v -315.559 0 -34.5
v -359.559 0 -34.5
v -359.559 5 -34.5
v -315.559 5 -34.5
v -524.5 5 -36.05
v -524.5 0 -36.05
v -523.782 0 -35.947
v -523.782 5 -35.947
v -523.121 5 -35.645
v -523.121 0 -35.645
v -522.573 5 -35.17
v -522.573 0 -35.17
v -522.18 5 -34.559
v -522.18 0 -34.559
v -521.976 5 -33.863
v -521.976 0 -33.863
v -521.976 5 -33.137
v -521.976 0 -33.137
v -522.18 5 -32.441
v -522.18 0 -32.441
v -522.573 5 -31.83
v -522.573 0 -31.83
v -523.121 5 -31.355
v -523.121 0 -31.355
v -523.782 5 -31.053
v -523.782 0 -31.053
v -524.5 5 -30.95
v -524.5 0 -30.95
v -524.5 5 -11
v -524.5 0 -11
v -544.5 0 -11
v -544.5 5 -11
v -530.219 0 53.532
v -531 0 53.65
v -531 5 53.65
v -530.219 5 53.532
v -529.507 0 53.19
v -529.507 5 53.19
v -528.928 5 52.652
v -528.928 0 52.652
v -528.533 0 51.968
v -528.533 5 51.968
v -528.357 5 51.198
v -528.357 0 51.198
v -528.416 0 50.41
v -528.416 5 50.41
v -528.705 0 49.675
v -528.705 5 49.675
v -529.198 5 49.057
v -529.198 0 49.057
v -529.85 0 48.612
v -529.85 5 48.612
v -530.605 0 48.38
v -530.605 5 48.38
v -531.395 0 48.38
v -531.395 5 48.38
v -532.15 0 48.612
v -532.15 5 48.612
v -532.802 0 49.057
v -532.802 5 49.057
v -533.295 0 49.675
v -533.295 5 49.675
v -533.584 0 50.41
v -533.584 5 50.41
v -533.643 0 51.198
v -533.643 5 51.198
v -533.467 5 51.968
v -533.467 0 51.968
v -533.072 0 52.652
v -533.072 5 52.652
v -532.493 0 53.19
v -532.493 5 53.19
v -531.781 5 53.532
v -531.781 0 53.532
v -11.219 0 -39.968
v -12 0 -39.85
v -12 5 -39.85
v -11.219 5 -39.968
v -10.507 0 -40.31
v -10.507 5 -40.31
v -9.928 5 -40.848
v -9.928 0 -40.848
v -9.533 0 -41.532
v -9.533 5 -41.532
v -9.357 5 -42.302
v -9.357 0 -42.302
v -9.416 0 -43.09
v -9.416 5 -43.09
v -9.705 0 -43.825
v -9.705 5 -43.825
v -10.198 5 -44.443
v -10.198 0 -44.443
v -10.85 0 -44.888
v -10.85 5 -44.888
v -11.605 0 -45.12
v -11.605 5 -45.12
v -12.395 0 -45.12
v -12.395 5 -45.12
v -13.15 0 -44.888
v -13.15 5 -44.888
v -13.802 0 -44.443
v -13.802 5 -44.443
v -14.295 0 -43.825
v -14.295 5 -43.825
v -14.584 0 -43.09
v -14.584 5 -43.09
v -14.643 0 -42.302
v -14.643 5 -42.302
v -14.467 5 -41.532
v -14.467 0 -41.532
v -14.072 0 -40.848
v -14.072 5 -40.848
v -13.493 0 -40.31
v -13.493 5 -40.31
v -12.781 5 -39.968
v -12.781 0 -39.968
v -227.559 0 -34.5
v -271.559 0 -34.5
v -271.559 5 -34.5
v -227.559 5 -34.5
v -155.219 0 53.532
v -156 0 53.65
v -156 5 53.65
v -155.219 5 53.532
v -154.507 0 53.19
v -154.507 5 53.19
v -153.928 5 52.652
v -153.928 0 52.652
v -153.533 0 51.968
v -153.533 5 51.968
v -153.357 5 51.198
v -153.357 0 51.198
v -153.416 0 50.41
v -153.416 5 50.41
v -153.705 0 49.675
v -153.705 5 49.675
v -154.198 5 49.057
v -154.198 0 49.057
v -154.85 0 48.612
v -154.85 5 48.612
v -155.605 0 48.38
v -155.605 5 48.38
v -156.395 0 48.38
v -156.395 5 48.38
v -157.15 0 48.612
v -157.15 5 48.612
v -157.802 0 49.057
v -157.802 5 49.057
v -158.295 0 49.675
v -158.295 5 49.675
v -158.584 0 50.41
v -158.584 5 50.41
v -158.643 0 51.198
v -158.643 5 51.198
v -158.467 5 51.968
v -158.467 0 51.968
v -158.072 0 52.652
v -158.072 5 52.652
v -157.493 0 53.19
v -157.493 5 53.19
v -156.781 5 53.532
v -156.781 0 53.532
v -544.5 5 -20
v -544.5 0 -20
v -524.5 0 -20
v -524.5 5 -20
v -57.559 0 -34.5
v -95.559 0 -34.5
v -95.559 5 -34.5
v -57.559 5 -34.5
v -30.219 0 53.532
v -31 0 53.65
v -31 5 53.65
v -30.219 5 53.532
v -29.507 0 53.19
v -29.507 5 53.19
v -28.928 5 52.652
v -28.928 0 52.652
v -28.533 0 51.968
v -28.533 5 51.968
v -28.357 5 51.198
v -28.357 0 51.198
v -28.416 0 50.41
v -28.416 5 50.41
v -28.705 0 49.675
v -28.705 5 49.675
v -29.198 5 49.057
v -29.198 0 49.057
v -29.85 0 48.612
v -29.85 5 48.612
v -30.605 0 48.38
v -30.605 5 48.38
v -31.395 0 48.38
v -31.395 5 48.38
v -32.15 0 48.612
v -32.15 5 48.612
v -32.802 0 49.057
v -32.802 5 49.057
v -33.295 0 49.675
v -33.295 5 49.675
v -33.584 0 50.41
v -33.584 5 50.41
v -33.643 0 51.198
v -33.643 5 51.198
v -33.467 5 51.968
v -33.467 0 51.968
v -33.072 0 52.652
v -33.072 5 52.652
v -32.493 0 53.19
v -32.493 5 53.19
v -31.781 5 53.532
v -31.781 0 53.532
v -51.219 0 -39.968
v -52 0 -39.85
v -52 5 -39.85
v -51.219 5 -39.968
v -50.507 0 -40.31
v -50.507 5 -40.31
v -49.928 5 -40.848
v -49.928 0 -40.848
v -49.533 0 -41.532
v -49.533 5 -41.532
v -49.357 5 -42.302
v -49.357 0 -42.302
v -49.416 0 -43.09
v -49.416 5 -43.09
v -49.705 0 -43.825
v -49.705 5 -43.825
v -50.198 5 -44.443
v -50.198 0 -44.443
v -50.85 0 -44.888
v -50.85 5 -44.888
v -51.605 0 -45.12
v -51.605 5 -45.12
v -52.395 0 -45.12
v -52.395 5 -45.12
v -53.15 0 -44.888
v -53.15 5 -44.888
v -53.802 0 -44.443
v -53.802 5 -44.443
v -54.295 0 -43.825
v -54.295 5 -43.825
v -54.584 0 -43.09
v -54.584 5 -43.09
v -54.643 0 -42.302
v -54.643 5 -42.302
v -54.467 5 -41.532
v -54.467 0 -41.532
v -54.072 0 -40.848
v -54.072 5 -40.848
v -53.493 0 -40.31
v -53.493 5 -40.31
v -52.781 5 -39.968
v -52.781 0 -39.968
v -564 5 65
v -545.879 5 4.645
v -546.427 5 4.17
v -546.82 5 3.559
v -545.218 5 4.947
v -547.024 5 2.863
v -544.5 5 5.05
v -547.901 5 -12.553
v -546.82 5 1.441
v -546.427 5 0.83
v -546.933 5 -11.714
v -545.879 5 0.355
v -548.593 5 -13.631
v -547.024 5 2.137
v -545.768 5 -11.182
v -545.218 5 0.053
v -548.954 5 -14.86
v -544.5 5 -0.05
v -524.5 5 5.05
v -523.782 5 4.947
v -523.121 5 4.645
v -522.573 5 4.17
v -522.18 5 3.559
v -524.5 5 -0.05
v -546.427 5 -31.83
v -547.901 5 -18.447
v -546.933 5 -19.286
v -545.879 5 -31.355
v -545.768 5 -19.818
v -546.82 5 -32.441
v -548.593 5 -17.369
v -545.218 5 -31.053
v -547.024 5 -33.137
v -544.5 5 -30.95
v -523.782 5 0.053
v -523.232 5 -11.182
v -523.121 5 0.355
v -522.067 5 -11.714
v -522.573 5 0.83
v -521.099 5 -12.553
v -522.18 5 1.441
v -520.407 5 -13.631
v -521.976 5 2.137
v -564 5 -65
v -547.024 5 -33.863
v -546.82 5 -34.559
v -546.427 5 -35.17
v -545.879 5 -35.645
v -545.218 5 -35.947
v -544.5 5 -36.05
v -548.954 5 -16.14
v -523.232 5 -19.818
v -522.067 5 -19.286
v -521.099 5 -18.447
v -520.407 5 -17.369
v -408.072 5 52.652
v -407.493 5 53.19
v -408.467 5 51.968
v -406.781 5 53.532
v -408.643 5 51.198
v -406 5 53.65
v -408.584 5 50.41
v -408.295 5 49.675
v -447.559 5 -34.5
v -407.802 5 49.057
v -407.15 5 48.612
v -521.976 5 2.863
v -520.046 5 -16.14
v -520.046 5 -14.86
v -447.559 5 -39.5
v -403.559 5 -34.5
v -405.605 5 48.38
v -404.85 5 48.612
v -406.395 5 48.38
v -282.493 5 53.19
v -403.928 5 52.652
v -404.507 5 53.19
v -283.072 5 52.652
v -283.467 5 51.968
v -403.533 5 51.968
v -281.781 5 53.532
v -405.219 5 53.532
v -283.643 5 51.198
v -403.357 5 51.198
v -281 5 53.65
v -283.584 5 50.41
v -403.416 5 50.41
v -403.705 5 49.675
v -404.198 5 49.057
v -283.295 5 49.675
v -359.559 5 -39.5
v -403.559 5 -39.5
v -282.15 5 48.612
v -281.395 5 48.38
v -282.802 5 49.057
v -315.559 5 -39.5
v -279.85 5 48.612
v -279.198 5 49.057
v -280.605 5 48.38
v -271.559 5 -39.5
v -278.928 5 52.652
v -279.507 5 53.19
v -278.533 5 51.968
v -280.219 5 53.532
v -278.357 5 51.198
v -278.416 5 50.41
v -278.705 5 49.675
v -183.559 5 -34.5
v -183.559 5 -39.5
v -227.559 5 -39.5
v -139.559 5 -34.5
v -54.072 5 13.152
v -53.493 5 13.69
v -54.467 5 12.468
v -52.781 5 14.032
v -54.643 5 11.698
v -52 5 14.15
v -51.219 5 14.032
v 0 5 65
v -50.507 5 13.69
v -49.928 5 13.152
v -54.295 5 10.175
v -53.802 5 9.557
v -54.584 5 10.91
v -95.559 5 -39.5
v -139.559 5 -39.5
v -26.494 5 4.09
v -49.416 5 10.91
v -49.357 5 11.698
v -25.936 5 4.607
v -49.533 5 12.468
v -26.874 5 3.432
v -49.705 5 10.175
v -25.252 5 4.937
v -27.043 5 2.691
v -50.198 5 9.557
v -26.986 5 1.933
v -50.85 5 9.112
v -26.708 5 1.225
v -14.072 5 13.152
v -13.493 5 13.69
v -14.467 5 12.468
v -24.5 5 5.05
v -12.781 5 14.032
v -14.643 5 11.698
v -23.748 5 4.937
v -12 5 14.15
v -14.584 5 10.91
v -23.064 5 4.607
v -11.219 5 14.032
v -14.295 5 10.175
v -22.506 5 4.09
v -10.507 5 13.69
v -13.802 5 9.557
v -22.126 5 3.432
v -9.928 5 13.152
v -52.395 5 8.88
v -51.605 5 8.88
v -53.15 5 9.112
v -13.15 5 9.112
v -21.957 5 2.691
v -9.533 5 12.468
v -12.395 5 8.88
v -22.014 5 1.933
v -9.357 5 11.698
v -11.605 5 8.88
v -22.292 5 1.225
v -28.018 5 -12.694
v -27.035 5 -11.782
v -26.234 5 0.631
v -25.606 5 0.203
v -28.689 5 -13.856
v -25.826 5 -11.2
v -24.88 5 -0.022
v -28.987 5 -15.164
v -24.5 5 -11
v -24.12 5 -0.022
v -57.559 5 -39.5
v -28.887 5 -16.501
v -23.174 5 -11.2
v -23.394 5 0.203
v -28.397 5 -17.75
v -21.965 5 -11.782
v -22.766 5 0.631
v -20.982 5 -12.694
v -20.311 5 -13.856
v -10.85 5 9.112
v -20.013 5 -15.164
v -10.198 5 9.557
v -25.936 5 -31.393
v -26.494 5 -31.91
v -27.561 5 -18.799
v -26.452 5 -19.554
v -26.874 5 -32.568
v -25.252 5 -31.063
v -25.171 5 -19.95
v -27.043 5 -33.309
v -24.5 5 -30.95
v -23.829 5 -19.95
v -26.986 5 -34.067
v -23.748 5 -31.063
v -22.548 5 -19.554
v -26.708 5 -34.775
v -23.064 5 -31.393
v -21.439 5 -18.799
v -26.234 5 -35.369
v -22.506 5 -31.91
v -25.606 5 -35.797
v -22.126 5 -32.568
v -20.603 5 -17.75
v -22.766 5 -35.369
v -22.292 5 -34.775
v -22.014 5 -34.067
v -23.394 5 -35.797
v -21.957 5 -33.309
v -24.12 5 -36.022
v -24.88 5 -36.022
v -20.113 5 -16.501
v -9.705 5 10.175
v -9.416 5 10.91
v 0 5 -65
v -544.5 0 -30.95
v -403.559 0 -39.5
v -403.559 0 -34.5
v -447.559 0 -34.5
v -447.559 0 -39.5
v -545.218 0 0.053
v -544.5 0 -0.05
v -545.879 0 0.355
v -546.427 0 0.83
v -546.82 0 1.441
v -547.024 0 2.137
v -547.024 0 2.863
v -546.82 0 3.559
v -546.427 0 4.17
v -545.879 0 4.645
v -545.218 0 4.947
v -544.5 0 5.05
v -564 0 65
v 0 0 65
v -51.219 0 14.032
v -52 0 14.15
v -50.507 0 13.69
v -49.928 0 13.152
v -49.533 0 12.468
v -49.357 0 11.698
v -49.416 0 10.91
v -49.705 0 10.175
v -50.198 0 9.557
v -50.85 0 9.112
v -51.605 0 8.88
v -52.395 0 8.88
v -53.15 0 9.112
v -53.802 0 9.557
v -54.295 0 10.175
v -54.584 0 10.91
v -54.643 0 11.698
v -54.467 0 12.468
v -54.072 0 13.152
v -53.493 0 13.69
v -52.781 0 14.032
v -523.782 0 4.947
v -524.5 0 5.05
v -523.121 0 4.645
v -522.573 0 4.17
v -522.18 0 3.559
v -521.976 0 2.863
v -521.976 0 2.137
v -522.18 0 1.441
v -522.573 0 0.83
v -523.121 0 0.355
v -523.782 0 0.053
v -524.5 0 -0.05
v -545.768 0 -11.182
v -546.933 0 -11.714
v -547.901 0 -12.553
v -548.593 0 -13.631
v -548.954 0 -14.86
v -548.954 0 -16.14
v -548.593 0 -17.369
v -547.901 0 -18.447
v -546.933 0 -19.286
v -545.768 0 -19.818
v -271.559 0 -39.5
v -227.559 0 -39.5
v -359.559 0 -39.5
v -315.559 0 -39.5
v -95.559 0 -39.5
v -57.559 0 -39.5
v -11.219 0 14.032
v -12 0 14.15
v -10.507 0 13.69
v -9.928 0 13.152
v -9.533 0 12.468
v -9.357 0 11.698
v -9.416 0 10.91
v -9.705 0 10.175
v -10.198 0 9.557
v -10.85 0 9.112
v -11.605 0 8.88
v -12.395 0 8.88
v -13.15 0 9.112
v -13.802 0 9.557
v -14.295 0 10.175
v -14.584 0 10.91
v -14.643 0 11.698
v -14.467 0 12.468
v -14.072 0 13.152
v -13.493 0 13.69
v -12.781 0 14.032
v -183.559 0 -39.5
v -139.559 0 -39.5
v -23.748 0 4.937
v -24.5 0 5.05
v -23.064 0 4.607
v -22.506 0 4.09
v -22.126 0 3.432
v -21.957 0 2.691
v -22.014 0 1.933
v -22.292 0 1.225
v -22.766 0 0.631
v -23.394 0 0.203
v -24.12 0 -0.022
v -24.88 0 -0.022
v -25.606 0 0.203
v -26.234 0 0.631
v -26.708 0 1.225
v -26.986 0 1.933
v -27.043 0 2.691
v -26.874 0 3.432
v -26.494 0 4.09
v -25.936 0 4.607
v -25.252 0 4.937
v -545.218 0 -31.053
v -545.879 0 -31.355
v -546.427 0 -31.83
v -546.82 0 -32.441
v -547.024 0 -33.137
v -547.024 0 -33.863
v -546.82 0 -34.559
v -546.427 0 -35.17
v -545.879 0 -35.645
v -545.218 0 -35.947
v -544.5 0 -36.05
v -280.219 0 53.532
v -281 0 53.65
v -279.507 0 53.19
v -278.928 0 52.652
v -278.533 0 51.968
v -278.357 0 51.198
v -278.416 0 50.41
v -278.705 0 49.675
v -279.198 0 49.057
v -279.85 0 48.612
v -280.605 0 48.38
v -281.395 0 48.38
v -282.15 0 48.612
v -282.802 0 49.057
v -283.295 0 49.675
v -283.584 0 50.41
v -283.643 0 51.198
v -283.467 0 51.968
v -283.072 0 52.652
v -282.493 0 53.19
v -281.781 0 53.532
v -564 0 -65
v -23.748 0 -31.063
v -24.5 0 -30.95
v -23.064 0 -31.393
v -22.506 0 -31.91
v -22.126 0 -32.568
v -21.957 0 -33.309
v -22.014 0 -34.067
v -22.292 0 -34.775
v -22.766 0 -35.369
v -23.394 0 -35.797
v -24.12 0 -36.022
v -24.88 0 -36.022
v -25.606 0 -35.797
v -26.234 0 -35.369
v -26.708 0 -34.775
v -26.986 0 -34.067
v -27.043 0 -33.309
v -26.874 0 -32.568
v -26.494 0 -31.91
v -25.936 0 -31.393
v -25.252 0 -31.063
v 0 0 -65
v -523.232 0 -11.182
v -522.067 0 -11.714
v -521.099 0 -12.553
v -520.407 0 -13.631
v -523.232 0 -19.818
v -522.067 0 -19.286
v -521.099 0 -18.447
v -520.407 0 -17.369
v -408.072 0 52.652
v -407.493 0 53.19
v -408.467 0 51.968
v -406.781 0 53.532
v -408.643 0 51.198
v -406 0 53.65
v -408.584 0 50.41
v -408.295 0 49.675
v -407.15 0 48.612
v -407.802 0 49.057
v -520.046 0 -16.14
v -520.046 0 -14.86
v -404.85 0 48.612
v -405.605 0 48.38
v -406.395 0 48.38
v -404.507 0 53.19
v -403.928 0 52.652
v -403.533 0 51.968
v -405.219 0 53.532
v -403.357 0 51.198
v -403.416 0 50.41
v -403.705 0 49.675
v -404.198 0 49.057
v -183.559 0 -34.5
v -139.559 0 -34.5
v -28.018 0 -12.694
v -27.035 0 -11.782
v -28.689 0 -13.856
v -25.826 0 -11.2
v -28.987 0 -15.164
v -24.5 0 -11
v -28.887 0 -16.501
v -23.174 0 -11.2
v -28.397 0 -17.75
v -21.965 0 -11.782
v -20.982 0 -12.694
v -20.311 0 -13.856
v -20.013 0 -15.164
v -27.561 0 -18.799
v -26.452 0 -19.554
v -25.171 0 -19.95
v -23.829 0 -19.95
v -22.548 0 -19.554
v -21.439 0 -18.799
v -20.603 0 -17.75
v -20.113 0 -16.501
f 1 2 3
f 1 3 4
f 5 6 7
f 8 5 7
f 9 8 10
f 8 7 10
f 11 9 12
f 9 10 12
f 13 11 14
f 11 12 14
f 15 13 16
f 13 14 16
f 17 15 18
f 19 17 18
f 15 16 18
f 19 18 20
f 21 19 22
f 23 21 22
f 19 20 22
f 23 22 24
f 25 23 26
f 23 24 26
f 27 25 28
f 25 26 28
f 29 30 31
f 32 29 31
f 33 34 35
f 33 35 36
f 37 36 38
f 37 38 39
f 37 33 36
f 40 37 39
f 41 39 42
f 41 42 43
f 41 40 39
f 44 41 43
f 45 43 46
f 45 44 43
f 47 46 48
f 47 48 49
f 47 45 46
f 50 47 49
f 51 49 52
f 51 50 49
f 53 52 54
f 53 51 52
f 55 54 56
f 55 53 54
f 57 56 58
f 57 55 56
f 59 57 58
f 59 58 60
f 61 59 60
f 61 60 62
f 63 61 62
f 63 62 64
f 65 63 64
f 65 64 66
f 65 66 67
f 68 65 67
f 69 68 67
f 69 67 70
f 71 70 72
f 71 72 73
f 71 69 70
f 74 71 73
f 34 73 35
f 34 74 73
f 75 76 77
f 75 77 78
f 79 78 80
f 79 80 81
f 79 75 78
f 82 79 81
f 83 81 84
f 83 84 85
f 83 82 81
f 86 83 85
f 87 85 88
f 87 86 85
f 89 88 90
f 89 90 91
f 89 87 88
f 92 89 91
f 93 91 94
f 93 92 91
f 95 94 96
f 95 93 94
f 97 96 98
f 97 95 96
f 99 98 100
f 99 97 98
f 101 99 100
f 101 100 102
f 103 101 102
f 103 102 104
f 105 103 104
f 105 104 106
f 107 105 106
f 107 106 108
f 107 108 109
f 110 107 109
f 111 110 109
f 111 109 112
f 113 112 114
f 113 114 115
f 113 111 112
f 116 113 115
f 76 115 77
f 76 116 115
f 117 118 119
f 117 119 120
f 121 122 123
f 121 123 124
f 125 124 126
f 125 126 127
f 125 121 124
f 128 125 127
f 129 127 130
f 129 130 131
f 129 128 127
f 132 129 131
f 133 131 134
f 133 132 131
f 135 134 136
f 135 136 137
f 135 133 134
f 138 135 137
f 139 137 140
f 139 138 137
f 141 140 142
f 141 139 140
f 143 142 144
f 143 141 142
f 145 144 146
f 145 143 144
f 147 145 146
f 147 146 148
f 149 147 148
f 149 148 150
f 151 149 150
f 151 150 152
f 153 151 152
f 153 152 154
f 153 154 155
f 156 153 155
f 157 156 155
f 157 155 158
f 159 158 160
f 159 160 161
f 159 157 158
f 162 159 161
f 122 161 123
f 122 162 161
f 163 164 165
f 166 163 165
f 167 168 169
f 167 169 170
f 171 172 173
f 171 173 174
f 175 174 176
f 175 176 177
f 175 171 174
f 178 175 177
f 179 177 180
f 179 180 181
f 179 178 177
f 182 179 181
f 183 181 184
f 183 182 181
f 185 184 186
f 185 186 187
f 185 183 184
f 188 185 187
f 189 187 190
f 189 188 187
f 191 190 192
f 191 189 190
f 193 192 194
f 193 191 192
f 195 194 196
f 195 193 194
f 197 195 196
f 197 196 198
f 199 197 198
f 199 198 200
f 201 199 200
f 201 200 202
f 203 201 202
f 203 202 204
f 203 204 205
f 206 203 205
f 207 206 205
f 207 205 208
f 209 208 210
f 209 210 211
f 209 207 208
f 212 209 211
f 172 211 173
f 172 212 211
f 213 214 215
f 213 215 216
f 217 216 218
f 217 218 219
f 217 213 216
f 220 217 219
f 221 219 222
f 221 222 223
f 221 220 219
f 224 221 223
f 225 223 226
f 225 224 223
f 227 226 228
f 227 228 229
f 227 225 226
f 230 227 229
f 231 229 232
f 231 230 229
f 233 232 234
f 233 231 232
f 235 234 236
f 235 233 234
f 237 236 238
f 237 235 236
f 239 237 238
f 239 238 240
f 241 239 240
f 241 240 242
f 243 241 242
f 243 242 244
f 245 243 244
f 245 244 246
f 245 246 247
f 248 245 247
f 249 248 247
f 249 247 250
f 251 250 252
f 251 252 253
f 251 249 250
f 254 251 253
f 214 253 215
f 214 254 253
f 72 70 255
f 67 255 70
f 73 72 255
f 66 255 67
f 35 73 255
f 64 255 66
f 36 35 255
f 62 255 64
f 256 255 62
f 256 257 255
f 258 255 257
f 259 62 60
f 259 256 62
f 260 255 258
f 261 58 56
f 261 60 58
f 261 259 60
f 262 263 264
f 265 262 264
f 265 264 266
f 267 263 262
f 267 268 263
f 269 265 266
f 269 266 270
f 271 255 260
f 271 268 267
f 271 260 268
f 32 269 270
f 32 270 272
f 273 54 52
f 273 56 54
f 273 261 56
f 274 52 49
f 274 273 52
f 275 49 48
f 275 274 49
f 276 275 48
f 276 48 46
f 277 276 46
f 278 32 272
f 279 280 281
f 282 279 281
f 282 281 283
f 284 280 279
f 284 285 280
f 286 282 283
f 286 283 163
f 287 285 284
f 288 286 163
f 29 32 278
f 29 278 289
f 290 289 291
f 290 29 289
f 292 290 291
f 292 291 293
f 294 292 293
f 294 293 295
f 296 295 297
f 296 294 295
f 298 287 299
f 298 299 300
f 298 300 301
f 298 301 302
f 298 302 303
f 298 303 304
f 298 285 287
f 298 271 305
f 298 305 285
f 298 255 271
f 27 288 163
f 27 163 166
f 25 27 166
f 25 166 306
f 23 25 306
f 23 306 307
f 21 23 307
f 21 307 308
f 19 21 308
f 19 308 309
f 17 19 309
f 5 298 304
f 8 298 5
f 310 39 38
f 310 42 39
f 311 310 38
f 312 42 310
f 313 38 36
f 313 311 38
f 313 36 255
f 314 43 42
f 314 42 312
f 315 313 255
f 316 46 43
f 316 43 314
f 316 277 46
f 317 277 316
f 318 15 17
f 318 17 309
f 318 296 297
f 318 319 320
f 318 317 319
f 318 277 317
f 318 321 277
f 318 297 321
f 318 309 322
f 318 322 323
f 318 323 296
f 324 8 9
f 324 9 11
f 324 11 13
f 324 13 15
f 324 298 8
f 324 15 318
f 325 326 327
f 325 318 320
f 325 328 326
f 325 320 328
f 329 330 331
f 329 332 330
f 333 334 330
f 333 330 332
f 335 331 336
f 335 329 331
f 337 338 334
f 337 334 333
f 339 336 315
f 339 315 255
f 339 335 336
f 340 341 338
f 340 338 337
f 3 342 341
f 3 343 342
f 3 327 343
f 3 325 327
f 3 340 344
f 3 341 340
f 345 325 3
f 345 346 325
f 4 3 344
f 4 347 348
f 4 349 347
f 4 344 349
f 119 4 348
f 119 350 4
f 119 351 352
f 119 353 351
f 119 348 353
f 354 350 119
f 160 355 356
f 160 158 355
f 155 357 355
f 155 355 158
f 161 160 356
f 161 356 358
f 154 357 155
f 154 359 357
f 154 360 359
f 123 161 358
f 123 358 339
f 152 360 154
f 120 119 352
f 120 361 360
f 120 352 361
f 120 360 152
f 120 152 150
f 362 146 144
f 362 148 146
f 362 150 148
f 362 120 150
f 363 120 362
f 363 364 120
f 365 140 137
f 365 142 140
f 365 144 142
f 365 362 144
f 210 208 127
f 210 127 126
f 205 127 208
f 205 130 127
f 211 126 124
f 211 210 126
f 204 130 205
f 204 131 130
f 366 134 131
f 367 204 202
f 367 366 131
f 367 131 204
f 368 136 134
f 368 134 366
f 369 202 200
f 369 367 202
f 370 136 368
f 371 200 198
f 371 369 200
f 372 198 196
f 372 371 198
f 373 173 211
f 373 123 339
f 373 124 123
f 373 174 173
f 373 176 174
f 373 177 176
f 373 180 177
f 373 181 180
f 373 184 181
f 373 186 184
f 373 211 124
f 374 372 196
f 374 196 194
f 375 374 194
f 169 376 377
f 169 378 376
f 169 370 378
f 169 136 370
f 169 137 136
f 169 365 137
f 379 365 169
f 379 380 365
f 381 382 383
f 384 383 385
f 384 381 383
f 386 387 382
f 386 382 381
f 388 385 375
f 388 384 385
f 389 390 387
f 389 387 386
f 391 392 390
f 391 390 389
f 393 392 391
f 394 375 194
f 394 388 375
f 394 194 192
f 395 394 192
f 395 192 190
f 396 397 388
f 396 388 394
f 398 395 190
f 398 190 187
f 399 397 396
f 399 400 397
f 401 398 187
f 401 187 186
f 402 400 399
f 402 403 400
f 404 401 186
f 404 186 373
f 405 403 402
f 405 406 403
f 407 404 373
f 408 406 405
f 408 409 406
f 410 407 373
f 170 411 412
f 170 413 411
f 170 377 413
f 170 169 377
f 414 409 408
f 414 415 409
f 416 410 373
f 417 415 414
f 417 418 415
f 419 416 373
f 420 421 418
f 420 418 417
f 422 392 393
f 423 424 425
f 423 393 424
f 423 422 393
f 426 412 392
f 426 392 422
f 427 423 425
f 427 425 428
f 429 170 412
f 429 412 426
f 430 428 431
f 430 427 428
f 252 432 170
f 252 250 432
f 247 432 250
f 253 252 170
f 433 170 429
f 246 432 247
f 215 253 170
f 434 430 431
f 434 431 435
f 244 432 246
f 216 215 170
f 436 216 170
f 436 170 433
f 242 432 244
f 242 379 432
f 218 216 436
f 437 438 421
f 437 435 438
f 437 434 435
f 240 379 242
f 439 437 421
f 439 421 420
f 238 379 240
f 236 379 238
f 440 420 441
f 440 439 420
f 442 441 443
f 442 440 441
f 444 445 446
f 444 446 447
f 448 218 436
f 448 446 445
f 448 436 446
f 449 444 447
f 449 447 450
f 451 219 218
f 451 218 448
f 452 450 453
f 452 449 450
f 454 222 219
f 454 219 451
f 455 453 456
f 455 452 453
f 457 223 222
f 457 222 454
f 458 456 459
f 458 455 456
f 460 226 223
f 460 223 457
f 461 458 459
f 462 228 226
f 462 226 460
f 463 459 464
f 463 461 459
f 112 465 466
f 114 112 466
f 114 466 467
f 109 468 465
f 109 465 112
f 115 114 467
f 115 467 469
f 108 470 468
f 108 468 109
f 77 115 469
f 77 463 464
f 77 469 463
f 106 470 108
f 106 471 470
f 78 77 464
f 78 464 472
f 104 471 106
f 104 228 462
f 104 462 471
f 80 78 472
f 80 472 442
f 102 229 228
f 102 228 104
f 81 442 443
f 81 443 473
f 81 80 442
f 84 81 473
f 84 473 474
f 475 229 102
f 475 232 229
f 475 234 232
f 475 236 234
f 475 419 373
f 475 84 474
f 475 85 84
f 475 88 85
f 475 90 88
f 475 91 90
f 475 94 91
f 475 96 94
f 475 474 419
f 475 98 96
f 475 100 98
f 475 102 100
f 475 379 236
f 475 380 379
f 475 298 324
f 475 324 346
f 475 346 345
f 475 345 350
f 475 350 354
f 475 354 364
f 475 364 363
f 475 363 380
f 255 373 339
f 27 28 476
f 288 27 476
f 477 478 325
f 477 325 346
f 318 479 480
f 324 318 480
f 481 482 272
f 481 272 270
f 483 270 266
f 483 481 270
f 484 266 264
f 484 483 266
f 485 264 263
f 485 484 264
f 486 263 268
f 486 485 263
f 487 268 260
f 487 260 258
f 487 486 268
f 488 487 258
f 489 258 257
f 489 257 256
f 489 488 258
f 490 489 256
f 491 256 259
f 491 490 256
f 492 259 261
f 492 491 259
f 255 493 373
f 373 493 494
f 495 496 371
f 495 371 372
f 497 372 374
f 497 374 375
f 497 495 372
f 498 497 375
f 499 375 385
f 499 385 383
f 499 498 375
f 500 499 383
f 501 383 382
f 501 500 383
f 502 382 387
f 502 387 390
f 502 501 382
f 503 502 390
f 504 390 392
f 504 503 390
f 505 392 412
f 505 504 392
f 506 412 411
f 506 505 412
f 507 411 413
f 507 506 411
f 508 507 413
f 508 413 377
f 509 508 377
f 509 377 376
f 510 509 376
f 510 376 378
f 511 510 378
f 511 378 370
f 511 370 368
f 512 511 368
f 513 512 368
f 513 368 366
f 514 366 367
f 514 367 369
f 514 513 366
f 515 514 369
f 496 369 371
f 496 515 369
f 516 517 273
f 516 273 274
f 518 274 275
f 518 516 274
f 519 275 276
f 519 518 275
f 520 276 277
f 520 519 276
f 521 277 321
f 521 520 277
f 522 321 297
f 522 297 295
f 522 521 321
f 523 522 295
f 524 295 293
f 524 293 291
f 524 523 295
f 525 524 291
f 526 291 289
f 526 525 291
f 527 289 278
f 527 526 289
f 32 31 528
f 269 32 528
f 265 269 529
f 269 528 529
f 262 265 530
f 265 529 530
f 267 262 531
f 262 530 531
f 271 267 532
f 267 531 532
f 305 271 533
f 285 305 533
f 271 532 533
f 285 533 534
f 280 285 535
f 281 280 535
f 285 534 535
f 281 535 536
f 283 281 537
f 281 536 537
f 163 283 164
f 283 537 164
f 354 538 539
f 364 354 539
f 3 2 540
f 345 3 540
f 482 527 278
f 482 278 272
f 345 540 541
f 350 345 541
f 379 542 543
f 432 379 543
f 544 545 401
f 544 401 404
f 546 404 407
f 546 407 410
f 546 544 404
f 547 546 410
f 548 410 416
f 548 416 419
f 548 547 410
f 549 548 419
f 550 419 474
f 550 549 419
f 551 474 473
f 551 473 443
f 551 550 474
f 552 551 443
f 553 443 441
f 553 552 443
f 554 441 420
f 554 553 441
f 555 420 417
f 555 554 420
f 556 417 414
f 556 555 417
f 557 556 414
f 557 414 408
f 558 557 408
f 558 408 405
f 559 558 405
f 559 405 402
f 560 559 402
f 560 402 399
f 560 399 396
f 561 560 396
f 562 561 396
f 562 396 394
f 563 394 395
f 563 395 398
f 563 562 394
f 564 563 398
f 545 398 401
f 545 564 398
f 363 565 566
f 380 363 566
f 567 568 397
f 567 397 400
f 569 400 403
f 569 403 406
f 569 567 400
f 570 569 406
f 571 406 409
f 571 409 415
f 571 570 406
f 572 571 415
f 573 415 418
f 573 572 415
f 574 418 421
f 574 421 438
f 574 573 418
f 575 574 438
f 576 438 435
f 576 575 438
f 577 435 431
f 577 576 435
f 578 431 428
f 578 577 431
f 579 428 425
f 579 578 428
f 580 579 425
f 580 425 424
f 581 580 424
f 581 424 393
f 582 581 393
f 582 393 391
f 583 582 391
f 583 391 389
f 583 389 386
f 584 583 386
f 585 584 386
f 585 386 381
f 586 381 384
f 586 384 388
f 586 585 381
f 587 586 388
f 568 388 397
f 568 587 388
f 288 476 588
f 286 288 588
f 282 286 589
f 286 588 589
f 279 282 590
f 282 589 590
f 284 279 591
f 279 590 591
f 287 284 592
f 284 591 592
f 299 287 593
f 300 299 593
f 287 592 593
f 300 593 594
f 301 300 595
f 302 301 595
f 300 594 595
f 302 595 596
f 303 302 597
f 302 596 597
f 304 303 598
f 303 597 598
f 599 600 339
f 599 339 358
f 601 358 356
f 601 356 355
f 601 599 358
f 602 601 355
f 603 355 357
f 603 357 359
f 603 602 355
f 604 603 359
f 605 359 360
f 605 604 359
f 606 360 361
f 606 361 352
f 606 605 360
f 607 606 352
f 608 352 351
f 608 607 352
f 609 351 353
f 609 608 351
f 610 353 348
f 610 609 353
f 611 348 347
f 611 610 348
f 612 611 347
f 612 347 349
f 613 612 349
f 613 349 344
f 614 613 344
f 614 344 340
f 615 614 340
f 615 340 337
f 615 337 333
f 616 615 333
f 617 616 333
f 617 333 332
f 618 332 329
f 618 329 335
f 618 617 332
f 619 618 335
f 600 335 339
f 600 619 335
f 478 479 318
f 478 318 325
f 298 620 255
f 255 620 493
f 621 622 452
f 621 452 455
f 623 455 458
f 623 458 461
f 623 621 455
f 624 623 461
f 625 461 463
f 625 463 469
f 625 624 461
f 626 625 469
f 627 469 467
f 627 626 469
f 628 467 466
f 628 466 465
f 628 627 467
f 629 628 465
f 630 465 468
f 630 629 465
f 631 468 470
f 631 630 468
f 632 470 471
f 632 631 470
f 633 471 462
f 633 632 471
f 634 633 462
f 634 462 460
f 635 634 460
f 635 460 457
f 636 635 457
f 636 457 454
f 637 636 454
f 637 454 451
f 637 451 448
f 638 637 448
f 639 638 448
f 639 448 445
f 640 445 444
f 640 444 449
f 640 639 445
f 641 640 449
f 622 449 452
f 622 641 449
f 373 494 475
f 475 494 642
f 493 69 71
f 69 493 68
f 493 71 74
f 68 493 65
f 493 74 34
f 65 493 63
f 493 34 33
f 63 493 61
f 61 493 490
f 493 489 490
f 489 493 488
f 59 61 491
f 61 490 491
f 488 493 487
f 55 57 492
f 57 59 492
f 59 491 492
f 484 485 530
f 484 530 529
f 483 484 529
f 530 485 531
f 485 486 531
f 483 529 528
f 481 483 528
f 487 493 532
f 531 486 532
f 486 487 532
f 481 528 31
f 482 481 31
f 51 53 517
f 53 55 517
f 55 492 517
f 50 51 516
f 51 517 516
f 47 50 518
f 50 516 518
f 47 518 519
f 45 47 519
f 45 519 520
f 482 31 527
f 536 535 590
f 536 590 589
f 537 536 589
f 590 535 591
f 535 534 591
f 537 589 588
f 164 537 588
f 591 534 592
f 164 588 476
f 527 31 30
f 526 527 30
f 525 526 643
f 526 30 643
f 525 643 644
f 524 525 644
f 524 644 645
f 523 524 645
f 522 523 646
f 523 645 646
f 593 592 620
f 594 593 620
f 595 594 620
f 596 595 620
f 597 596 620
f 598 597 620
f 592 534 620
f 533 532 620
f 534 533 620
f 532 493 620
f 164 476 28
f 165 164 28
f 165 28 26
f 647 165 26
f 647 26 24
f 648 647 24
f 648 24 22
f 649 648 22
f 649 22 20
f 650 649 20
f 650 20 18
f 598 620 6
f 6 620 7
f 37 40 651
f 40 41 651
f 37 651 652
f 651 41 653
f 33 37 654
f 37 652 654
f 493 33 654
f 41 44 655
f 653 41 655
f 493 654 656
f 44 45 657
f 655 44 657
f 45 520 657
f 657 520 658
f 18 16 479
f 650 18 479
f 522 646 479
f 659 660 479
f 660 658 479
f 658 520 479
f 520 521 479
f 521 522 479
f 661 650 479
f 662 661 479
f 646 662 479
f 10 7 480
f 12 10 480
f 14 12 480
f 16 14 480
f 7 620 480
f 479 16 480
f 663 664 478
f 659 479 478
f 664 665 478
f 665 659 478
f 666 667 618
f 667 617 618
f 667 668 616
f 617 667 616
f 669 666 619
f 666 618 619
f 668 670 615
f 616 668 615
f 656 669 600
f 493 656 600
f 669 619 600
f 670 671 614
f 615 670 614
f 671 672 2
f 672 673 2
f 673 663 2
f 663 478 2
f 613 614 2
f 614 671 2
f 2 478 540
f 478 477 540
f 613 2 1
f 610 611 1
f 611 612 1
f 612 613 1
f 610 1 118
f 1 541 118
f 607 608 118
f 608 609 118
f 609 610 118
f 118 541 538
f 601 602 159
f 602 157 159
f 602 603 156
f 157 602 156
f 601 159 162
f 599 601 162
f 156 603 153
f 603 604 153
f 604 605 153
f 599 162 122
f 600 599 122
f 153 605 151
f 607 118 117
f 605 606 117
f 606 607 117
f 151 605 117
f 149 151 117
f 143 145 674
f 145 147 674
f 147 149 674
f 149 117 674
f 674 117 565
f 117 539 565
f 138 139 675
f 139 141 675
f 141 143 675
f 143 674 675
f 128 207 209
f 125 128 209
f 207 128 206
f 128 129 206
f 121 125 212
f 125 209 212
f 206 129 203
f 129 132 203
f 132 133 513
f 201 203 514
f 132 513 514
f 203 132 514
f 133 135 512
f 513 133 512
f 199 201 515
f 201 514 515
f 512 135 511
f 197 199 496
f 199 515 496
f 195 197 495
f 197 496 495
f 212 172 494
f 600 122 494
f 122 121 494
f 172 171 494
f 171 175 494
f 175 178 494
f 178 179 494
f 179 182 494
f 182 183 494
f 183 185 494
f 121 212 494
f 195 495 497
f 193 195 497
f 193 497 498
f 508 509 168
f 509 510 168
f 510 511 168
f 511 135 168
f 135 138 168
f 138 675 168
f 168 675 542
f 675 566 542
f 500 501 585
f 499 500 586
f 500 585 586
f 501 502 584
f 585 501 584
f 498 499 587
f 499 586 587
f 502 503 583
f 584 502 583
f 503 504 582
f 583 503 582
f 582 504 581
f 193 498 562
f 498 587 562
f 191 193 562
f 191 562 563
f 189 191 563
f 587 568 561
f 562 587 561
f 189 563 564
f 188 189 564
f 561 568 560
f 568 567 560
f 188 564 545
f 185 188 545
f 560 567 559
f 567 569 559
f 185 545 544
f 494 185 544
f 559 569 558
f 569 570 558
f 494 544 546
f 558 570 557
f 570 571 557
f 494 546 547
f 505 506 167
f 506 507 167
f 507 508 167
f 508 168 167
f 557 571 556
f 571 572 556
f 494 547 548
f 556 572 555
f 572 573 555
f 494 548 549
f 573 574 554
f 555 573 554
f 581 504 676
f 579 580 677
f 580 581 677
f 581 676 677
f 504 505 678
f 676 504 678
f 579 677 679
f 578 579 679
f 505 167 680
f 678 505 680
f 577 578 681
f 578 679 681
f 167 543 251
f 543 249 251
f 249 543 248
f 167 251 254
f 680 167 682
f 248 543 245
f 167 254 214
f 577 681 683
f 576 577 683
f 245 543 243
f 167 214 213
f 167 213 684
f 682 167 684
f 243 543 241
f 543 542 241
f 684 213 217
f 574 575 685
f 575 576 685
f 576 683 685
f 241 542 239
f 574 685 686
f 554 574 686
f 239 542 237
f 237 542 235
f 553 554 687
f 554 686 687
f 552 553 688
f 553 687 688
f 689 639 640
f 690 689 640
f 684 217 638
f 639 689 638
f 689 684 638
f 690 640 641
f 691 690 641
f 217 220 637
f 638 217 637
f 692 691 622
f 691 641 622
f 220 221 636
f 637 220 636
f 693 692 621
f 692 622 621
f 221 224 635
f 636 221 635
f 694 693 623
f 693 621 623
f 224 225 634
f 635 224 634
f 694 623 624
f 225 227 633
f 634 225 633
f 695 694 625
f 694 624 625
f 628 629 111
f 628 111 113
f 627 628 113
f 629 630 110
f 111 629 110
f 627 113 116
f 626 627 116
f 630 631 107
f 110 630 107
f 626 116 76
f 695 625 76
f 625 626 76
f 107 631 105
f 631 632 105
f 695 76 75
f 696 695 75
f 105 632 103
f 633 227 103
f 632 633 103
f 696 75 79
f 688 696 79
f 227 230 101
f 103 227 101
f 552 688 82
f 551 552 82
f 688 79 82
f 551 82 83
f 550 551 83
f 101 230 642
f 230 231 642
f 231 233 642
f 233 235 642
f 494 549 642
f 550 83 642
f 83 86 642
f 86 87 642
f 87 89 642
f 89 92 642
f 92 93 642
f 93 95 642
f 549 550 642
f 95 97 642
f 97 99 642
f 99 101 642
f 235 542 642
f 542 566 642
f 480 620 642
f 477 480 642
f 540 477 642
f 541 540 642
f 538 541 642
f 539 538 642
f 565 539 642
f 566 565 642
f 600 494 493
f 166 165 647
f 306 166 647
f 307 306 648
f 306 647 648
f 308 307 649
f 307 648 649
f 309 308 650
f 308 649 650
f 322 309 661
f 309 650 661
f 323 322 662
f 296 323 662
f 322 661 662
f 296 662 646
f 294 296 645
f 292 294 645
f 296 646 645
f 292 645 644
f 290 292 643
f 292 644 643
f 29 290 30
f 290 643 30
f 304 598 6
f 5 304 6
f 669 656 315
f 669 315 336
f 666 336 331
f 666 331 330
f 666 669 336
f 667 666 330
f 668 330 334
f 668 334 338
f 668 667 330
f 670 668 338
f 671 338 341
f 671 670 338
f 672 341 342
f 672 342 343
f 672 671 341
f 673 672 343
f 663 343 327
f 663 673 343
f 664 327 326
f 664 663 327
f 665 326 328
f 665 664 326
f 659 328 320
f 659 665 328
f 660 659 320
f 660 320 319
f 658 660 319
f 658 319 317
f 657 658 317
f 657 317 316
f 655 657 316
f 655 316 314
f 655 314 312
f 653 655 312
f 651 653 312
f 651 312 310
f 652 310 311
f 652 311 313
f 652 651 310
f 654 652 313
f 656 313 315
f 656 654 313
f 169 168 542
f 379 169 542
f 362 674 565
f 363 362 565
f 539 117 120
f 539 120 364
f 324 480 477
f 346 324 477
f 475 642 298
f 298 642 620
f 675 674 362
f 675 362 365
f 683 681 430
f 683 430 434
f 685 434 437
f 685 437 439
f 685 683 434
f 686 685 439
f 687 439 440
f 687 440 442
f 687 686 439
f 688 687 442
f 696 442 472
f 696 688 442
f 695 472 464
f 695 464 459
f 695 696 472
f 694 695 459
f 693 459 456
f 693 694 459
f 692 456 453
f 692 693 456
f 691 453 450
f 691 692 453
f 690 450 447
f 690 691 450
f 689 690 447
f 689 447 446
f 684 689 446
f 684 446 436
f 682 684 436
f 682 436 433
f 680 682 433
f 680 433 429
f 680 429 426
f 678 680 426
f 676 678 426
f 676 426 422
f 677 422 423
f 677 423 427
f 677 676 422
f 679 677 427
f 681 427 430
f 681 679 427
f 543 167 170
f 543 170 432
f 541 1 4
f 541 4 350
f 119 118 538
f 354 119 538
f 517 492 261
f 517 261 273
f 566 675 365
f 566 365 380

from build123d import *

# Parameters (mm, degrees)
SKETCH1_R           = 2.65
SKETCH1_R_2         = 2.55
SKETCH1_R_3         = 4.5
SKETCH1_W           = 38
SKETCH1_H           = 5
SKETCH1_W_2         = 44
BOSS_EXTRUDE1_DEPTH = 5


with BuildPart() as part:
    # Sketch1 → Boss-Extrude1 (new body)
    with BuildSketch(Plane(origin=(0, 0, 0), x_dir=(1, 0, 0), z_dir=(0, 1, 0))):
        Polygon((0, 0), (0, 40), (0, 65), (-564, 65), (-564, -65), (-524.5, -65), (0, -65), align=None)
        with Locations(Location((-12, 42.5, 0), (0, 0, 270))):
            Circle(SKETCH1_R, mode=Mode.SUBTRACT)
        with Locations(Location((-24.5, 33.5, 0), (0, 0, 270))):
            Circle(SKETCH1_R_2, mode=Mode.SUBTRACT)
        with Locations(Location((-24.5, -2.5, 0), (0, 0, 270))):
            Circle(SKETCH1_R_2, mode=Mode.SUBTRACT)
        with Locations(Location((-24.5, 15.5, 0), (0, 0, 270))):
            Circle(SKETCH1_R_3, mode=Mode.SUBTRACT)
        with Locations(Location((-12, -11.5, 0), (0, 0, 270))):
            Circle(SKETCH1_R, mode=Mode.SUBTRACT)
        with Locations(Location((-531, -51, 0), (0, 0, 270))):
            Circle(SKETCH1_R, mode=Mode.SUBTRACT)
        with Locations(Location((-406, -51, 0), (0, 0, 270))):
            Circle(SKETCH1_R, mode=Mode.SUBTRACT)
        with Locations(Location((-281, -51, 0), (0, 0, 270))):
            Circle(SKETCH1_R, mode=Mode.SUBTRACT)
        with Locations(Location((-156, -51, 0), (0, 0, 270))):
            Circle(SKETCH1_R, mode=Mode.SUBTRACT)
        with Locations(Location((-52, -11.5, 0), (0, 0, 270))):
            Circle(SKETCH1_R, mode=Mode.SUBTRACT)
        with Locations(Location((-52, 42.5, 0), (0, 0, 270))):
            Circle(SKETCH1_R, mode=Mode.SUBTRACT)
        with Locations(Location((-31, -51, 0), (0, 0, 270))):
            Circle(SKETCH1_R, mode=Mode.SUBTRACT)
        with Locations((-76.559496053, 37)):
            Rectangle(SKETCH1_W, SKETCH1_H, mode=Mode.SUBTRACT)
        with BuildLine():
            Line((-544.5, 36.05), (-524.5, 36.05))
            ThreePointArc((-524.5, 36.05), (-521.95, 33.5), (-524.5, 30.95))
            Line((-524.5, 30.95), (-544.5, 30.95))
            ThreePointArc((-544.5, 30.95), (-547.05, 33.5), (-544.5, 36.05))
        make_face(mode=Mode.SUBTRACT)
        with BuildLine():
            Line((-524.5, 0.05), (-544.5, 0.05))
            ThreePointArc((-544.5, 0.05), (-547.05, -2.5), (-544.5, -5.05))
            Line((-544.5, -5.05), (-524.5, -5.05))
            ThreePointArc((-524.5, -5.05), (-521.95, -2.5), (-524.5, 0.05))
        make_face(mode=Mode.SUBTRACT)
        with BuildLine():
            Line((-544.5, 20), (-524.5, 20))
            ThreePointArc((-524.5, 20), (-520, 15.5), (-524.5, 11))
            Line((-524.5, 11), (-544.5, 11))
            ThreePointArc((-544.5, 11), (-549, 15.5), (-544.5, 20))
        make_face(mode=Mode.SUBTRACT)
        with Locations((-161.559496053, 37)):
            Rectangle(SKETCH1_W_2, SKETCH1_H, mode=Mode.SUBTRACT)
        with Locations((-249.559496053, 37)):
            Rectangle(SKETCH1_W_2, SKETCH1_H, mode=Mode.SUBTRACT)
        with Locations((-337.559496053, 37)):
            Rectangle(SKETCH1_W_2, SKETCH1_H, mode=Mode.SUBTRACT)
        with Locations((-425.559496053, 37)):
            Rectangle(SKETCH1_W_2, SKETCH1_H, mode=Mode.SUBTRACT)
    extrude(amount=BOSS_EXTRUDE1_DEPTH)


solid = part.part
